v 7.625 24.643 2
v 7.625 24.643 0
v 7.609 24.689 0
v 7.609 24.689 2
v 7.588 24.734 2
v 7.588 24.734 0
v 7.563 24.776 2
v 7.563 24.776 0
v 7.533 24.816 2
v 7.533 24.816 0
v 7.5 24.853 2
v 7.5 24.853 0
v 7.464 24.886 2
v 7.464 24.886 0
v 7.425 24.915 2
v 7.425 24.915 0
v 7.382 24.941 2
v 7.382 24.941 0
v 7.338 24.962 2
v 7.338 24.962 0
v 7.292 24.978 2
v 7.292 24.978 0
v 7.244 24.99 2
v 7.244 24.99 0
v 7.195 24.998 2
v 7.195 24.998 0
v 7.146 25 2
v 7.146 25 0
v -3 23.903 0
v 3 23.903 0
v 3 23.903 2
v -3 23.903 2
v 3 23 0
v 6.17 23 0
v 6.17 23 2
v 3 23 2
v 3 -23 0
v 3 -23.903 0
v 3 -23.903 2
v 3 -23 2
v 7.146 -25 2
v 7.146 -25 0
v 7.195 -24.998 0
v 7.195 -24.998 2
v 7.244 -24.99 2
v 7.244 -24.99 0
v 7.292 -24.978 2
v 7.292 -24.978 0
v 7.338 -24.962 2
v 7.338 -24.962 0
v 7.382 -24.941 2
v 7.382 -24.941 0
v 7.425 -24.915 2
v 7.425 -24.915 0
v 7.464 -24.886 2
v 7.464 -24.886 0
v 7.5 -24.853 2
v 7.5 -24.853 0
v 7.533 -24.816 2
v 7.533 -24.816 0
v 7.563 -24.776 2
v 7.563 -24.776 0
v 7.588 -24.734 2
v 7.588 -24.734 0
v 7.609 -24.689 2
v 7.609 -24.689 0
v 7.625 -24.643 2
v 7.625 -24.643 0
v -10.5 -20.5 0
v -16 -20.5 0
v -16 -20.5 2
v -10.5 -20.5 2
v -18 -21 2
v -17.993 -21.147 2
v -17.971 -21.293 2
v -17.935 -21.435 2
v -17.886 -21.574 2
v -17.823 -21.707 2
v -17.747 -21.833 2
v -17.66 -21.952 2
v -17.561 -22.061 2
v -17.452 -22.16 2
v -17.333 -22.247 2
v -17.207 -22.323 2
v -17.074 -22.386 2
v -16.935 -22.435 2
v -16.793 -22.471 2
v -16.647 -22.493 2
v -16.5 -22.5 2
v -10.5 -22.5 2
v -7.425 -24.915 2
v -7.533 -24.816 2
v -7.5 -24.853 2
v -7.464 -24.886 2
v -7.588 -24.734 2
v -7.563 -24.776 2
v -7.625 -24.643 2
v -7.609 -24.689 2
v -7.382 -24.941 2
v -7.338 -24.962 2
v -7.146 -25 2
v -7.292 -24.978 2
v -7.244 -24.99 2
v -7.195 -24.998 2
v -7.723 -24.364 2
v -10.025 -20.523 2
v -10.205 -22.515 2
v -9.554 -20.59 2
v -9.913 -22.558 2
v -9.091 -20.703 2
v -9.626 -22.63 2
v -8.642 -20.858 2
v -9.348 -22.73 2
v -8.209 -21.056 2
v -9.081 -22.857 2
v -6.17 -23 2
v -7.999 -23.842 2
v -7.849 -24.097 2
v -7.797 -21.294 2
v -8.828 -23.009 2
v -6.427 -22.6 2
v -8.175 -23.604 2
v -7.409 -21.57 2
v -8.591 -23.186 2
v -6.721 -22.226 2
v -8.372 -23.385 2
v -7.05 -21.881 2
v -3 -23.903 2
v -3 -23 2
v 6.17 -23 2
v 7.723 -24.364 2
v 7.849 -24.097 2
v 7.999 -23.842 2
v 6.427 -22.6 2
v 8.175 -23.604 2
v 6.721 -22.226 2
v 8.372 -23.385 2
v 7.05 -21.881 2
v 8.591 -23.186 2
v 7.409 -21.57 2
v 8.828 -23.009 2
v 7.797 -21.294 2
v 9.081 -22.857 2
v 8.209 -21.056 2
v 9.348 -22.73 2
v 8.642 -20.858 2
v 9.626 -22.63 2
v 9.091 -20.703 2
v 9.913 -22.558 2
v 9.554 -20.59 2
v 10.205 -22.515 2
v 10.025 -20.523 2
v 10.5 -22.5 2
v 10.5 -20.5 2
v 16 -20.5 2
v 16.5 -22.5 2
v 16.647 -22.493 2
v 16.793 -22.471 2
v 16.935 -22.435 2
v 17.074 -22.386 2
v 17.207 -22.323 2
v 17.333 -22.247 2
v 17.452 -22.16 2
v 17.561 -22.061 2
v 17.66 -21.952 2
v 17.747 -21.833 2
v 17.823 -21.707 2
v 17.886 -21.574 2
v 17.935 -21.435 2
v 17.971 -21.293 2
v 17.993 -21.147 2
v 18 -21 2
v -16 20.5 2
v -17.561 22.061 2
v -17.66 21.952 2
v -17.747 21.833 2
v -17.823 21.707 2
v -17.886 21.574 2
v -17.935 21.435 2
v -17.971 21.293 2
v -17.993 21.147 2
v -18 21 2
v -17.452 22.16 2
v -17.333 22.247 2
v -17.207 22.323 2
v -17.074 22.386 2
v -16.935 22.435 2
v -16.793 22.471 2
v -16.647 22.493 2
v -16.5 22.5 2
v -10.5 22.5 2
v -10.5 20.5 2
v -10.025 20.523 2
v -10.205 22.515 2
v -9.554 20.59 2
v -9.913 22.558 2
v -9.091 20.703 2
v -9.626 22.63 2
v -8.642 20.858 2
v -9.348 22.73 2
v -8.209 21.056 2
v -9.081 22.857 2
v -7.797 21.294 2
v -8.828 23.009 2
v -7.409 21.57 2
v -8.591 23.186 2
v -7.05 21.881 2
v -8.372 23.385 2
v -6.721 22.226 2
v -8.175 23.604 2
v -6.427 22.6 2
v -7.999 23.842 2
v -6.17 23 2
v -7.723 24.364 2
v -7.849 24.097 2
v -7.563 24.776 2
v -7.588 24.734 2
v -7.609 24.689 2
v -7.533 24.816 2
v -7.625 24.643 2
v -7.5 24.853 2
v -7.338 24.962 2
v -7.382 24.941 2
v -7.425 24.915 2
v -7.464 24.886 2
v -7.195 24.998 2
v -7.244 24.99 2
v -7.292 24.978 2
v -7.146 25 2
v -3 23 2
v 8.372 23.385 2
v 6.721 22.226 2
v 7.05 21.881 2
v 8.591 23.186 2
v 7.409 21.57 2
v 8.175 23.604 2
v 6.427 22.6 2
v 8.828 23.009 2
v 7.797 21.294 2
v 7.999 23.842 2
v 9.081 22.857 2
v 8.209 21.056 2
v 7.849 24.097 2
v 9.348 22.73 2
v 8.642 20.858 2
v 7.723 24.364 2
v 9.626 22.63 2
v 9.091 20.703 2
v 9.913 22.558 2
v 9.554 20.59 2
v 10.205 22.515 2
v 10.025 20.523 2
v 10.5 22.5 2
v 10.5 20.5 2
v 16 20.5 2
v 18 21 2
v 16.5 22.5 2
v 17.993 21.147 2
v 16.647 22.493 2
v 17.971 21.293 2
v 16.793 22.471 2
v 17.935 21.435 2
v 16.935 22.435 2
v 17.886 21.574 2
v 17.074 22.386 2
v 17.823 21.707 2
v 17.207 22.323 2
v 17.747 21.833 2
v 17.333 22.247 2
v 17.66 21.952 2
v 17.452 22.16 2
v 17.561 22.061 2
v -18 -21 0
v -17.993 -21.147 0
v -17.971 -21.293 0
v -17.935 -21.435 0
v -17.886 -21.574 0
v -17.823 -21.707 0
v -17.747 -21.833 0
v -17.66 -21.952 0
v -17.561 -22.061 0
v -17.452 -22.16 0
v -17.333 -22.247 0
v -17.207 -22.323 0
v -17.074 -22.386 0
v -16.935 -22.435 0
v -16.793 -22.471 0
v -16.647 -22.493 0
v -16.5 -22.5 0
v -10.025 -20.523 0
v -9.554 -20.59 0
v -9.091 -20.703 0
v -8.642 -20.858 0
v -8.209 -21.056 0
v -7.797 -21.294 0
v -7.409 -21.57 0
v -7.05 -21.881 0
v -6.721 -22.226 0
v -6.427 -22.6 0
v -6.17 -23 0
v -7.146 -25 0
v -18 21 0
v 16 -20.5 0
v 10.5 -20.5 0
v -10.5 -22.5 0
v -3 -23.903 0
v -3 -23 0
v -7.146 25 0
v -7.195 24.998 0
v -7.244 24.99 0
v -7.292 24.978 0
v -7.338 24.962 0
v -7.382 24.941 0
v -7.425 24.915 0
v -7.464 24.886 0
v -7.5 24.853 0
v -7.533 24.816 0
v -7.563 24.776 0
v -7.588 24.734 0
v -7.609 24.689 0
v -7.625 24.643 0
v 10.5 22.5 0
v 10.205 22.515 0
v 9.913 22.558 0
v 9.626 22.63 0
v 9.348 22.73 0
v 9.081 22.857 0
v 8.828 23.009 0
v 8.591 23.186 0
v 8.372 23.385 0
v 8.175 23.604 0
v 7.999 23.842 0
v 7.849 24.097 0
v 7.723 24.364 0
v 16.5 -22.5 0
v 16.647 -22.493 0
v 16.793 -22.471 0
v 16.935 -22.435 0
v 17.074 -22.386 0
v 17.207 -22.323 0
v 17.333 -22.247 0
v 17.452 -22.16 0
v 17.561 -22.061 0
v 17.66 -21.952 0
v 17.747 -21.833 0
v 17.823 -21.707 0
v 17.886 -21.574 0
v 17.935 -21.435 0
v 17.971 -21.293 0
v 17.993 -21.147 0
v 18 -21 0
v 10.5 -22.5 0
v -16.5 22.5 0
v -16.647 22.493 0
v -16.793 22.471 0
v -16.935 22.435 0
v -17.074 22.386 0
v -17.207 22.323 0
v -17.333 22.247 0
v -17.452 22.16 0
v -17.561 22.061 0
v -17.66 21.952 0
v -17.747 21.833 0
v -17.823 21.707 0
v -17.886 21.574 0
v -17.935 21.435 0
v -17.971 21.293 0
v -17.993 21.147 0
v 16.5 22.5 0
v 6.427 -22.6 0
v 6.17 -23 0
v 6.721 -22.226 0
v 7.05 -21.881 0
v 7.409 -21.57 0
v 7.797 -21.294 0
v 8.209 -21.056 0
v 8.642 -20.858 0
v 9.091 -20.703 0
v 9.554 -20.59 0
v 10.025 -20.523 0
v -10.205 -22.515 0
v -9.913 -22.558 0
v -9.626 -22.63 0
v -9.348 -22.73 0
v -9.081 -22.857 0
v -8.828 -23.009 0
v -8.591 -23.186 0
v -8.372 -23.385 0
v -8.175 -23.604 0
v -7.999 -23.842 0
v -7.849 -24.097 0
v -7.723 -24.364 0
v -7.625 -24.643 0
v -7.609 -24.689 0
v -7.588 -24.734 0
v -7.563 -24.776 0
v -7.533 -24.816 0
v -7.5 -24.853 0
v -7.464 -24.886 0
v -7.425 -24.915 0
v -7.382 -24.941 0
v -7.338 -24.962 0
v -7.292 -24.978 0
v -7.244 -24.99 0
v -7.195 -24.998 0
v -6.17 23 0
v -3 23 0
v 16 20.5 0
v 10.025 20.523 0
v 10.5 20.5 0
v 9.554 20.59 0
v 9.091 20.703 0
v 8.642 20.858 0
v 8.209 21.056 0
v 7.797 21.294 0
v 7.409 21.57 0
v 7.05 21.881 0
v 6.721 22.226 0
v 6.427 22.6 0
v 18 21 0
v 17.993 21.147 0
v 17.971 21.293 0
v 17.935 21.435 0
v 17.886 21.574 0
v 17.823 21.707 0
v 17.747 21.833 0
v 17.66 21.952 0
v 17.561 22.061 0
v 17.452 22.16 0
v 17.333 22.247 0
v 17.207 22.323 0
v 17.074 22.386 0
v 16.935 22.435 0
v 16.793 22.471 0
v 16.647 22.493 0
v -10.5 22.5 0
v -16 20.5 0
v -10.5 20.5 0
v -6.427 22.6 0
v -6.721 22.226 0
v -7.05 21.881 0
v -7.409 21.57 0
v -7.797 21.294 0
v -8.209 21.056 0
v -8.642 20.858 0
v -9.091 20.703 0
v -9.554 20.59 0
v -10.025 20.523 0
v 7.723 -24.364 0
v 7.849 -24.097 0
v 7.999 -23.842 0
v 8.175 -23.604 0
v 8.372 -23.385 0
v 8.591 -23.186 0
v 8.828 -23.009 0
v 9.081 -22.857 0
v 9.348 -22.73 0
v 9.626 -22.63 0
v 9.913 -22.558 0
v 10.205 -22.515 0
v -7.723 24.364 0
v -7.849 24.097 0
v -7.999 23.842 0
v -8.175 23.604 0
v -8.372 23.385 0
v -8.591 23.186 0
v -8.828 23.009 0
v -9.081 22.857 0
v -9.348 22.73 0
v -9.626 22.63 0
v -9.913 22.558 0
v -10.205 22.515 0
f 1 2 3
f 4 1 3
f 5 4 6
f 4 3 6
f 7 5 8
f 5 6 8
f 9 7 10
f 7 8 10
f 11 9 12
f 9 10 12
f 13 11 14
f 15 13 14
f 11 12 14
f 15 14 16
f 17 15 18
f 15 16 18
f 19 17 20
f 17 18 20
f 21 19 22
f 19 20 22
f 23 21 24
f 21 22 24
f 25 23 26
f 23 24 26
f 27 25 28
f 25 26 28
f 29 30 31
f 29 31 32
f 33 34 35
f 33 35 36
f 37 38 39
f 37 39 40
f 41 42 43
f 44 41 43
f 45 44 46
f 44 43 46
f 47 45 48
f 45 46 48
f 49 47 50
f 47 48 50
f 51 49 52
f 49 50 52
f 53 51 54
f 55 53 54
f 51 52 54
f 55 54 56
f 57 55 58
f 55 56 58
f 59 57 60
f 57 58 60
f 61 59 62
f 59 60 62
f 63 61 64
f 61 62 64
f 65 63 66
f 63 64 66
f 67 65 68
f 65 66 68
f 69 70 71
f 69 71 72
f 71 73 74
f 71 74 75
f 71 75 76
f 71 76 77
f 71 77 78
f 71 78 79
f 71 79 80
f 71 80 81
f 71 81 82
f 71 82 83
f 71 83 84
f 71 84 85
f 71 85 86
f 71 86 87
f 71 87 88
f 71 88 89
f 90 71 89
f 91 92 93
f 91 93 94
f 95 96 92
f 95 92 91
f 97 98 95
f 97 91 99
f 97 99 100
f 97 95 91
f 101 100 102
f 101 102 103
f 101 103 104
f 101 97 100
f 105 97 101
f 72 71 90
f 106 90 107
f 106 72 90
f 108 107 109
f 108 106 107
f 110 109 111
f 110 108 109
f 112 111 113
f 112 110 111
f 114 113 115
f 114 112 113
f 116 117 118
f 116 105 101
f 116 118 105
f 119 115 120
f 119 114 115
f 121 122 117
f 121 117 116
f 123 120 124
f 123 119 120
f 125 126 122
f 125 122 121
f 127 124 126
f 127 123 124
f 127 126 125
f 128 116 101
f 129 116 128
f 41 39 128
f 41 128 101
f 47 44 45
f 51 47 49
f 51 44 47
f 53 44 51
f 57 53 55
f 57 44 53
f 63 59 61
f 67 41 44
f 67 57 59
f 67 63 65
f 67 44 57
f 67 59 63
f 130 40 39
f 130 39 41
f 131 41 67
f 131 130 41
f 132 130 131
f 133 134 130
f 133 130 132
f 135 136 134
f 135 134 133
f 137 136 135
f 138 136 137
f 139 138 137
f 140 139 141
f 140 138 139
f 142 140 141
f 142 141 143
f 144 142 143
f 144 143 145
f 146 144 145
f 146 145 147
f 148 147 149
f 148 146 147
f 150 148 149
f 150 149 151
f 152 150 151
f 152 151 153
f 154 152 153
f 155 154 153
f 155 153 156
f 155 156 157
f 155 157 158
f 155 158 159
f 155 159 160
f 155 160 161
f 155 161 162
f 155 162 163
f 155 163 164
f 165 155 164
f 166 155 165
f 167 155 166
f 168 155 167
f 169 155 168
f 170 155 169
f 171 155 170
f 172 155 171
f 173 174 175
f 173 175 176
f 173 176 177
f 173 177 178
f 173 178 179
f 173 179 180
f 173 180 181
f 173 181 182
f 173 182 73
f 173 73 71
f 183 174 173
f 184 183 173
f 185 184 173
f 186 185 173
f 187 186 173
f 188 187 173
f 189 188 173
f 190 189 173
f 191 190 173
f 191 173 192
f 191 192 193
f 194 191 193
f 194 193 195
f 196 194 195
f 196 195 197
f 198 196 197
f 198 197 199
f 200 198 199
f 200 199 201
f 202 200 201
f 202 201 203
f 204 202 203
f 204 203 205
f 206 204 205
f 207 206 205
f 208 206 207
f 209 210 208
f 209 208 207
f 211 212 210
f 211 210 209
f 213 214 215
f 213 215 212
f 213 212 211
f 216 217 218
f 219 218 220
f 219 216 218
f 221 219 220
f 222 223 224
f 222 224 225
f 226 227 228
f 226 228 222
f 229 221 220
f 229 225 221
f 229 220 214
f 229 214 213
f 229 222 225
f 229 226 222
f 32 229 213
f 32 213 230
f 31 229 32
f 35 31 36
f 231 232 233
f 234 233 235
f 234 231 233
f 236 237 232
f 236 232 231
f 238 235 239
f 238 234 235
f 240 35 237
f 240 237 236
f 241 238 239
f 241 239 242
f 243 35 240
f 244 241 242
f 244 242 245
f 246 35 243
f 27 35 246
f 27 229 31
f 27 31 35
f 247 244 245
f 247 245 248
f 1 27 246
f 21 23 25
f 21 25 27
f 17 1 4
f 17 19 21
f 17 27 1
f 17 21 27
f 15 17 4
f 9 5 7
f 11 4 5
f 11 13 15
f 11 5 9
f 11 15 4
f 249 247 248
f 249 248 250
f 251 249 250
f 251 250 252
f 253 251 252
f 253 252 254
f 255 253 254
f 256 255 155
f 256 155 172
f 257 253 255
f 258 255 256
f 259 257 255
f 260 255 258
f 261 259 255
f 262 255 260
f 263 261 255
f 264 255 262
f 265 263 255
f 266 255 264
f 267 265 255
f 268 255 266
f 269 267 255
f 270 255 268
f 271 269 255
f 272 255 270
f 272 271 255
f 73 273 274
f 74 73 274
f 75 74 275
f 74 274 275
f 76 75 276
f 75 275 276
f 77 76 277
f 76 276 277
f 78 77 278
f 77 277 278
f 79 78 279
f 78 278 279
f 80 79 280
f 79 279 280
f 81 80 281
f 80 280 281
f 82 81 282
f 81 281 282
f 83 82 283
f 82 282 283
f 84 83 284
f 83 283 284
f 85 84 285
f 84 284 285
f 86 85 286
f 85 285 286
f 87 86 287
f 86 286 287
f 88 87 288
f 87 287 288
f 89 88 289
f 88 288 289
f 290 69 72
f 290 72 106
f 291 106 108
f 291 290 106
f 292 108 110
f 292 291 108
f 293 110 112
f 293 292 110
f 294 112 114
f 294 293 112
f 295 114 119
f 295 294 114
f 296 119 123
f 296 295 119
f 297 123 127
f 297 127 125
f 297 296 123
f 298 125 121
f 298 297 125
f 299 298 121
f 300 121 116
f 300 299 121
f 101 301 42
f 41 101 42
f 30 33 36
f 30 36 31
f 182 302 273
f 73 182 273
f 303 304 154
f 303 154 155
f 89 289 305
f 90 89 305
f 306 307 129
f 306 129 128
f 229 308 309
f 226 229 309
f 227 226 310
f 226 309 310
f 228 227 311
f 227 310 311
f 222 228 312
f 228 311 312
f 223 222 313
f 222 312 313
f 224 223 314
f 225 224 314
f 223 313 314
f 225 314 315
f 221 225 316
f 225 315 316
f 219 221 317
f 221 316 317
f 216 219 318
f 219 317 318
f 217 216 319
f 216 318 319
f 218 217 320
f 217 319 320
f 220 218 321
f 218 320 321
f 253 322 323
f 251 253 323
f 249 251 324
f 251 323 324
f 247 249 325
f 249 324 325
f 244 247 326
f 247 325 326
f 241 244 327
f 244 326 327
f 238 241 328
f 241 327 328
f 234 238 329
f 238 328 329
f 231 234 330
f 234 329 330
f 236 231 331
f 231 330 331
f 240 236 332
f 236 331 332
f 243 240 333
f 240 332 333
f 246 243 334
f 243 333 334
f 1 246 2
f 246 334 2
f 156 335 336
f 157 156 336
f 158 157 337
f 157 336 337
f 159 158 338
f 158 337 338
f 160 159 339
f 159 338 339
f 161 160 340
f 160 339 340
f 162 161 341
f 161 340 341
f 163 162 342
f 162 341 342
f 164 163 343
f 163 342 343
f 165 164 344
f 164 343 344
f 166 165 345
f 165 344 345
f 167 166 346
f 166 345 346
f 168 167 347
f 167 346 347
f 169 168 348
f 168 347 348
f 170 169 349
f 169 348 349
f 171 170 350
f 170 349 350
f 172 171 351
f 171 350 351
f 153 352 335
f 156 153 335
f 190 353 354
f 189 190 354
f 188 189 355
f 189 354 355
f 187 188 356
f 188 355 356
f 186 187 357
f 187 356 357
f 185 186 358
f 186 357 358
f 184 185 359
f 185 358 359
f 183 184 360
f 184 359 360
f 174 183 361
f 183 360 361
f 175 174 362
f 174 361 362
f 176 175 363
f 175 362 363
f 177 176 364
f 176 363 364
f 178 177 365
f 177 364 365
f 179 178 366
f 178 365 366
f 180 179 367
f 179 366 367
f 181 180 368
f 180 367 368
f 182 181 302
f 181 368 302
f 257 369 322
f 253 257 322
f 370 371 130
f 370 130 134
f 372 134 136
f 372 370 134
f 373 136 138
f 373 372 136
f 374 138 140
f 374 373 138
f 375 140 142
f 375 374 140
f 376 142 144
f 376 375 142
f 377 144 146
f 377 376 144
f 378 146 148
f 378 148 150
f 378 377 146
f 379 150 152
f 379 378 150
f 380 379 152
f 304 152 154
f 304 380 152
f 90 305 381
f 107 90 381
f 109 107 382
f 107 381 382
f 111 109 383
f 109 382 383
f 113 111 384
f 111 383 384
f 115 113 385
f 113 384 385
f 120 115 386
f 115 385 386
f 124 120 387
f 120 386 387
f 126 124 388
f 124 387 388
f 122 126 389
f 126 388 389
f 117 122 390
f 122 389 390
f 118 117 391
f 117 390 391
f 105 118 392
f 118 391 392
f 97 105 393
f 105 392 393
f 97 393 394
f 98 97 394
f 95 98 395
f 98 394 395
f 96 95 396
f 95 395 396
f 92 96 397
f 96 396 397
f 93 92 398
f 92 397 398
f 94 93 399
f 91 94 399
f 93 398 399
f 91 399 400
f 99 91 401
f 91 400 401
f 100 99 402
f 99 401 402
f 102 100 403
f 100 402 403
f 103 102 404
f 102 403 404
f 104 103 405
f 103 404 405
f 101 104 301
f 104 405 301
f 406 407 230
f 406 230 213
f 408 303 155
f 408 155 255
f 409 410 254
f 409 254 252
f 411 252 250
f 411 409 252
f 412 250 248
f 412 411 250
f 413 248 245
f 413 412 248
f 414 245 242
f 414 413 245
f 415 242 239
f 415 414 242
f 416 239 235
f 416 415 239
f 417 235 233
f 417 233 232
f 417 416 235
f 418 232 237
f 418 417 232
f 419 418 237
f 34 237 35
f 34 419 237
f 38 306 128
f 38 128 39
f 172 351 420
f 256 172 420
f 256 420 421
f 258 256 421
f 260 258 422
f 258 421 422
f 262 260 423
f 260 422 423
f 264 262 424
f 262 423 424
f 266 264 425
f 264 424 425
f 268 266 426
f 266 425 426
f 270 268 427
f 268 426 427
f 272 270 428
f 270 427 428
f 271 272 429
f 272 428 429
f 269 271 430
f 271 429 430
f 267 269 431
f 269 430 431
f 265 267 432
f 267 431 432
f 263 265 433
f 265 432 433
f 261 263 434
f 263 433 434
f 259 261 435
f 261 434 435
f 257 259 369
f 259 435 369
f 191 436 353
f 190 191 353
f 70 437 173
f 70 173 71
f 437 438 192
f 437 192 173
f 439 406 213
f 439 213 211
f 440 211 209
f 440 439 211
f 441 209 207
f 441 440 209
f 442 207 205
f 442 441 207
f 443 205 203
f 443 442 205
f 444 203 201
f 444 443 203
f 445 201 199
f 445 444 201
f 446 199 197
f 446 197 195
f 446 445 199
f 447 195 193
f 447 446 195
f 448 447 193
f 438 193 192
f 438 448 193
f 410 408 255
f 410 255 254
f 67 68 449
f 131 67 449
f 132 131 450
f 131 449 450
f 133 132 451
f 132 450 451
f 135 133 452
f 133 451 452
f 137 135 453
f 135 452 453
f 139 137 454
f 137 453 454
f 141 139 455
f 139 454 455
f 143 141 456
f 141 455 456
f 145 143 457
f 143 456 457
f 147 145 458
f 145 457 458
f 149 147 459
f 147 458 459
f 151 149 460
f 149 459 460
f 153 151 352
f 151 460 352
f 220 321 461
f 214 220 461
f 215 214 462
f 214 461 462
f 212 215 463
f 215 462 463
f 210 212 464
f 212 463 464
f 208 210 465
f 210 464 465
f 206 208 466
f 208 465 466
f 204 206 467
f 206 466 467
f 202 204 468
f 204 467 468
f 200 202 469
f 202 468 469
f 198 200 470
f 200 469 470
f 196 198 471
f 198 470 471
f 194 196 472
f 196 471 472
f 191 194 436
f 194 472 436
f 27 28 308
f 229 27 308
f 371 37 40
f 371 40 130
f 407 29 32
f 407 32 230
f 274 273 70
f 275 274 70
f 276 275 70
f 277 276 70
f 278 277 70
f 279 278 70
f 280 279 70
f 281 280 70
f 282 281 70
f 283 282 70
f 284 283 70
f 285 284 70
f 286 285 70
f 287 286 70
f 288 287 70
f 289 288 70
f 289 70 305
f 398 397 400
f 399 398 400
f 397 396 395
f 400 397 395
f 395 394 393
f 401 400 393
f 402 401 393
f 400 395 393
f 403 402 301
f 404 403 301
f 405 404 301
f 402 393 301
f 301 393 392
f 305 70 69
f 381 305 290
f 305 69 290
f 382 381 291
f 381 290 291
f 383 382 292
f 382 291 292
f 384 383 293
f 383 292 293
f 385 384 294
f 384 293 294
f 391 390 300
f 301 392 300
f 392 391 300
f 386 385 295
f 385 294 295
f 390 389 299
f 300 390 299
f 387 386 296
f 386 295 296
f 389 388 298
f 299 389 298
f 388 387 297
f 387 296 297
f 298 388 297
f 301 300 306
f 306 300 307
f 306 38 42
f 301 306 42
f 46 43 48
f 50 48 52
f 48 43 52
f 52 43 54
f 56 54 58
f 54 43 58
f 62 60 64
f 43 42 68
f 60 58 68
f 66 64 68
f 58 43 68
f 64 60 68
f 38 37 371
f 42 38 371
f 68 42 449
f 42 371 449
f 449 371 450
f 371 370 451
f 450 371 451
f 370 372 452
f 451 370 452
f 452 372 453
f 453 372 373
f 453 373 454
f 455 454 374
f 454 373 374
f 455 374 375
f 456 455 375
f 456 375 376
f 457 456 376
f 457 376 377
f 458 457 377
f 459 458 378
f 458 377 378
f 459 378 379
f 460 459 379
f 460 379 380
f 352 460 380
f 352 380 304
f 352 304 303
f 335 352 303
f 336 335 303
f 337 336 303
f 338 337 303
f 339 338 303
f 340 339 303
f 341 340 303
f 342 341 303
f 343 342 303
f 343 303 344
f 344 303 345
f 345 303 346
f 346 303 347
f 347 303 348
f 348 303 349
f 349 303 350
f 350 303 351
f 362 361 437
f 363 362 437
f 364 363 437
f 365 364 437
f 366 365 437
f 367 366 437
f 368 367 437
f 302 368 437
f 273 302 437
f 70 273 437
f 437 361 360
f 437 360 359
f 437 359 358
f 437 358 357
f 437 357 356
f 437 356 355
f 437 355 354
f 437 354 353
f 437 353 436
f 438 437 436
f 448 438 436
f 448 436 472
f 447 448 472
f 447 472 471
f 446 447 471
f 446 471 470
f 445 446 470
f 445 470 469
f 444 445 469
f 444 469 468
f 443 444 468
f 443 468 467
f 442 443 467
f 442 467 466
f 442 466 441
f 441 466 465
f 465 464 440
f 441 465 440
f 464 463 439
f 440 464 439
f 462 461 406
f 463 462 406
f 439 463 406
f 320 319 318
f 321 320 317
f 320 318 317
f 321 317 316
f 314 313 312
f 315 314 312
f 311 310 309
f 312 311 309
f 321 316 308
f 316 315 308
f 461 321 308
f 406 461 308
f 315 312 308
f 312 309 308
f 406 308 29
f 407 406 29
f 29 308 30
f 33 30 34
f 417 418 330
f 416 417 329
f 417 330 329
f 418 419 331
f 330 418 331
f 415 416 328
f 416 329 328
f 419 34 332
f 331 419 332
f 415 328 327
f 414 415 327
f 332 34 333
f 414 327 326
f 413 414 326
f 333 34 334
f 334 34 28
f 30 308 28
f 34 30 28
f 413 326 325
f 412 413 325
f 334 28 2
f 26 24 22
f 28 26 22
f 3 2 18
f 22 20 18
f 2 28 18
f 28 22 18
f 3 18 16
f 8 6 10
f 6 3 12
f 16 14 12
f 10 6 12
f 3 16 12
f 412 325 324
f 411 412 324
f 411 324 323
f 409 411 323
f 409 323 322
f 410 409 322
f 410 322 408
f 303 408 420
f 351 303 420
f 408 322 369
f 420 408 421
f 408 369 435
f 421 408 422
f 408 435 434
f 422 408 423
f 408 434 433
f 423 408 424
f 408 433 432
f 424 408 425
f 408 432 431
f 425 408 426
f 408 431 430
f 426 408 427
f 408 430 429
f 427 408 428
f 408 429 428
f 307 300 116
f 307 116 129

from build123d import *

# Parameters (mm, degrees)
BASE_EXTRUSION_DEPTH = 2


with BuildPart() as part:
    # Esquisse1 → Base-Extrusion (new body)
    with BuildSketch(Plane.XY):
        with BuildLine():
            Line((-16.5, -22.5), (-10.5, -22.5))
            ThreePointArc((-10.5, -22.5), (-8.707157086, -23.094648823), (-7.625055458, -24.642857143))
            ThreePointArc((-7.625055458, -24.642857143), (-7.444705186, -24.900891863), (-7.145898034, -25))
            Line((-7.145898034, -25), (7.145898034, -25))
            ThreePointArc((7.145898034, -25), (7.444705186, -24.900891863), (7.625055458, -24.642857143))
            ThreePointArc((7.625055458, -24.642857143), (8.707157086, -23.094648823), (10.5, -22.5))
            Line((10.5, -22.5), (16.5, -22.5))
            ThreePointArc((16.5, -22.5), (17.560660172, -22.060660172), (18, -21))
            Line((18, -21), (18, 21))
            ThreePointArc((18, 21), (17.560660172, 22.060660172), (16.5, 22.5))
            Line((16.5, 22.5), (10.5, 22.5))
            ThreePointArc((10.5, 22.5), (8.707157086, 23.094648823), (7.625055458, 24.642857143))
            ThreePointArc((7.625055458, 24.642857143), (7.444705186, 24.900891863), (7.145898034, 25))
            Line((7.145898034, 25), (-7.145898034, 25))
            ThreePointArc((-7.145898034, 25), (-7.444705186, 24.900891863), (-7.625055458, 24.642857143))
            ThreePointArc((-7.625055458, 24.642857143), (-8.707157086, 23.094648823), (-10.5, 22.5))
            Line((-10.5, 22.5), (-16.5, 22.5))
            ThreePointArc((-16.5, 22.5), (-17.560660172, 22.060660172), (-18, 21))
            Line((-18, 21), (-18, -21))
            ThreePointArc((-18, -21), (-17.560660172, -22.060660172), (-16.5, -22.5))
        make_face()
        with BuildLine():
            Line((-16, -20.5), (-10.5, -20.5))
            ThreePointArc((-10.5, -20.5), (-8, -21.169872981), (-6.169872981, -23))
            Line((-6.169872981, -23), (-3, -23))
            Line((-3, -23), (-3, -23.903020069))
            Line((-3, -23.903020069), (3, -23.903020069))
            Line((3, -23.903020069), (3, -23))
            Line((3, -23), (6.169872981, -23))
            ThreePointArc((6.169872981, -23), (8, -21.169872981), (10.5, -20.5))
            Line((10.5, -20.5), (16, -20.5))
            Line((16, -20.5), (16, 20.5))
            Line((16, 20.5), (10.5, 20.5))
            ThreePointArc((10.5, 20.5), (8, 21.169872981), (6.169872981, 23))
            Line((6.169872981, 23), (3, 23))
            Line((3, 23), (3, 23.903020069))
            Line((3, 23.903020069), (-3, 23.903020069))
            Line((-3, 23.903020069), (-3, 23))
            Line((-3, 23), (-6.169872981, 23))
            ThreePointArc((-6.169872981, 23), (-8, 21.169872981), (-10.5, 20.5))
            Line((-10.5, 20.5), (-16, 20.5))
            Line((-16, 20.5), (-16, -20.5))
        make_face(mode=Mode.SUBTRACT)
    extrude(amount=BASE_EXTRUSION_DEPTH)


solid = part.part
